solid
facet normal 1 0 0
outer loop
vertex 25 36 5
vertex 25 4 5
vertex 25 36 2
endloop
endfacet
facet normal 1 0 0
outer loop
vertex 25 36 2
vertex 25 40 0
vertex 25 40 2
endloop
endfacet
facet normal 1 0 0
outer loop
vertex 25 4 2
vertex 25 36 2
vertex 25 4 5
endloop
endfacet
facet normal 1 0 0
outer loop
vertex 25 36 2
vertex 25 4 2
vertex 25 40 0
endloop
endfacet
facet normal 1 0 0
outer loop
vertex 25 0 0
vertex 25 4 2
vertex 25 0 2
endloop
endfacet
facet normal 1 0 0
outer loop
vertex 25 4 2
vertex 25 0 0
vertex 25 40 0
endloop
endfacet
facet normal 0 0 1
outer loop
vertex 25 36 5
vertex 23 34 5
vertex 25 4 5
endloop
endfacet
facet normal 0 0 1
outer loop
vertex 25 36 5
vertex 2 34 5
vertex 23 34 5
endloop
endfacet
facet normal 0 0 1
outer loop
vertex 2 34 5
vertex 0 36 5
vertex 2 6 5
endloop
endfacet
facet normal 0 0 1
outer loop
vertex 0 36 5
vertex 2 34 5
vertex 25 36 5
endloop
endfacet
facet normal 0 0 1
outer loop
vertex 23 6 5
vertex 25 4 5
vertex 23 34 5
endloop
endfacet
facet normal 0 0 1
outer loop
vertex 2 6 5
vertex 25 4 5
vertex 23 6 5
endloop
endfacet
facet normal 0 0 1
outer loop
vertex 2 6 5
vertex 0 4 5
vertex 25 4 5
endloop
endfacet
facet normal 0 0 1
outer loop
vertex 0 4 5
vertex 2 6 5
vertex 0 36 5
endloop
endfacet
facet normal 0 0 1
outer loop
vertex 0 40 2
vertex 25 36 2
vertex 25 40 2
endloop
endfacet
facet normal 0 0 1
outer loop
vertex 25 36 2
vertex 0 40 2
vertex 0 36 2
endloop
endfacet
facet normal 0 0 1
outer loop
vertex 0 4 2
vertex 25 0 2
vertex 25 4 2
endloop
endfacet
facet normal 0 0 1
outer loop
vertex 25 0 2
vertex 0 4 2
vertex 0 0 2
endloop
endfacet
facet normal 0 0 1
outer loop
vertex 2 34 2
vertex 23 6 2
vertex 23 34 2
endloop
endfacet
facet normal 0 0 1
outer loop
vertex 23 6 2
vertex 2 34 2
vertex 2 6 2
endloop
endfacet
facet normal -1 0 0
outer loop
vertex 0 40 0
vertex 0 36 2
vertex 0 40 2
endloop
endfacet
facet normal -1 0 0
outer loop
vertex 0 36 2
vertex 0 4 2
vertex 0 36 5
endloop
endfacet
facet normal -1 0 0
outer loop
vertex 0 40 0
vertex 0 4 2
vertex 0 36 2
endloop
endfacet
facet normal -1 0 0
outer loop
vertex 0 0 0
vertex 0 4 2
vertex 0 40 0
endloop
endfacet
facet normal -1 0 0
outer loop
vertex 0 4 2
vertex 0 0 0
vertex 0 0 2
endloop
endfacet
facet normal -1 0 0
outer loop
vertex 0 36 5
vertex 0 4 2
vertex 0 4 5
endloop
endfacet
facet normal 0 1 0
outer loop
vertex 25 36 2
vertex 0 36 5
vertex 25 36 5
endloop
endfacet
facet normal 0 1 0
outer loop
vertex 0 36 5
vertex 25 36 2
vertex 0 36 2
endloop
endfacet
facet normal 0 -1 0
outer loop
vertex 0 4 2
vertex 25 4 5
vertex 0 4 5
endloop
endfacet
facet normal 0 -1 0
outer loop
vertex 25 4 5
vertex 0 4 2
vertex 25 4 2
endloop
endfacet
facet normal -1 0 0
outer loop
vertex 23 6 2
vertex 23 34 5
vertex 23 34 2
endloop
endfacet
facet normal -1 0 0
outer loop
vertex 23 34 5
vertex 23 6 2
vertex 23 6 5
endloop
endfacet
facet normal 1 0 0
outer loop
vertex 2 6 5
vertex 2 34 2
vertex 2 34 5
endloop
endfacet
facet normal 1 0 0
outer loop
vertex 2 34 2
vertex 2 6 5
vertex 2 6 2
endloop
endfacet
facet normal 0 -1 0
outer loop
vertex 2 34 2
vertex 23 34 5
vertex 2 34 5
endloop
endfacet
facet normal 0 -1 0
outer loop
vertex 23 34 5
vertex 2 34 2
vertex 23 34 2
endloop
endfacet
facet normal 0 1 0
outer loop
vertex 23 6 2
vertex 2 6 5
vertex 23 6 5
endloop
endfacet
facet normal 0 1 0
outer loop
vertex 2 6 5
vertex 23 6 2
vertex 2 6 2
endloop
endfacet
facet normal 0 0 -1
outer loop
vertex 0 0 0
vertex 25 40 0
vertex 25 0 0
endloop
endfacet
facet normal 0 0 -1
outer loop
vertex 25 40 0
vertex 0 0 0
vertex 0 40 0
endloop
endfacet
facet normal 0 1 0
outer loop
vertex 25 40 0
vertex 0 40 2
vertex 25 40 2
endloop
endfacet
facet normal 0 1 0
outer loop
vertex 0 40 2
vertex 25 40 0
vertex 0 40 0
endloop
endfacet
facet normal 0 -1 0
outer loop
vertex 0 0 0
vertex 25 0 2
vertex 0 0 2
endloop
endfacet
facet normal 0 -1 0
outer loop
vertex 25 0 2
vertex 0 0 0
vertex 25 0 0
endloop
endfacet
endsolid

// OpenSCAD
/*
	name: 		fixme-price-list-empty-frame.scad
	author:	Aymeric B.
	date:		02.09.2014
*/


/****** PARAMETERS ****/
$fn = 50;
_thickness = 2;
_clearance = 0.1;

_frame_height = 40;
_frame_width = 25;
_cleat_size = 4;
_cleat_elevation = 2;
_elevation = 5;


/****** MODULES ****/
module RoundingEdge(radius, length) {	
	difference() {
		translate([0, 0, -_clearance]) {
			cube([2*radius+_clearance, 
					2*radius+_clearance, 
					length+2*_clearance]);
		}
		translate([0, 0, -2*_clearance]) {
			cylinder(r=radius,h=length+4*_clearance);
		}
	}
}

module BackPlate(width, height, thickness) {
	cube([width, height, thickness]);
}

module FrameBorder(width, height, elevation, thickness) {
	difference() {
		cube([width, height, elevation]); 
		translate([thickness, thickness, -thickness]) { 
			cube([width-2*thickness, 
					height-2*thickness, 
					elevation+2*thickness]);
		}
	}
}

module Draw() {
	BackPlate(_frame_width, _frame_height, _cleat_elevation);
	translate([0, _cleat_size, _cleat_elevation]) {
		FrameBorder(_frame_width, 
						_frame_height-2*_cleat_size, 
						_elevation-_cleat_elevation,
						_thickness);
	}
}

/****** RENDERS ****/
Draw();
